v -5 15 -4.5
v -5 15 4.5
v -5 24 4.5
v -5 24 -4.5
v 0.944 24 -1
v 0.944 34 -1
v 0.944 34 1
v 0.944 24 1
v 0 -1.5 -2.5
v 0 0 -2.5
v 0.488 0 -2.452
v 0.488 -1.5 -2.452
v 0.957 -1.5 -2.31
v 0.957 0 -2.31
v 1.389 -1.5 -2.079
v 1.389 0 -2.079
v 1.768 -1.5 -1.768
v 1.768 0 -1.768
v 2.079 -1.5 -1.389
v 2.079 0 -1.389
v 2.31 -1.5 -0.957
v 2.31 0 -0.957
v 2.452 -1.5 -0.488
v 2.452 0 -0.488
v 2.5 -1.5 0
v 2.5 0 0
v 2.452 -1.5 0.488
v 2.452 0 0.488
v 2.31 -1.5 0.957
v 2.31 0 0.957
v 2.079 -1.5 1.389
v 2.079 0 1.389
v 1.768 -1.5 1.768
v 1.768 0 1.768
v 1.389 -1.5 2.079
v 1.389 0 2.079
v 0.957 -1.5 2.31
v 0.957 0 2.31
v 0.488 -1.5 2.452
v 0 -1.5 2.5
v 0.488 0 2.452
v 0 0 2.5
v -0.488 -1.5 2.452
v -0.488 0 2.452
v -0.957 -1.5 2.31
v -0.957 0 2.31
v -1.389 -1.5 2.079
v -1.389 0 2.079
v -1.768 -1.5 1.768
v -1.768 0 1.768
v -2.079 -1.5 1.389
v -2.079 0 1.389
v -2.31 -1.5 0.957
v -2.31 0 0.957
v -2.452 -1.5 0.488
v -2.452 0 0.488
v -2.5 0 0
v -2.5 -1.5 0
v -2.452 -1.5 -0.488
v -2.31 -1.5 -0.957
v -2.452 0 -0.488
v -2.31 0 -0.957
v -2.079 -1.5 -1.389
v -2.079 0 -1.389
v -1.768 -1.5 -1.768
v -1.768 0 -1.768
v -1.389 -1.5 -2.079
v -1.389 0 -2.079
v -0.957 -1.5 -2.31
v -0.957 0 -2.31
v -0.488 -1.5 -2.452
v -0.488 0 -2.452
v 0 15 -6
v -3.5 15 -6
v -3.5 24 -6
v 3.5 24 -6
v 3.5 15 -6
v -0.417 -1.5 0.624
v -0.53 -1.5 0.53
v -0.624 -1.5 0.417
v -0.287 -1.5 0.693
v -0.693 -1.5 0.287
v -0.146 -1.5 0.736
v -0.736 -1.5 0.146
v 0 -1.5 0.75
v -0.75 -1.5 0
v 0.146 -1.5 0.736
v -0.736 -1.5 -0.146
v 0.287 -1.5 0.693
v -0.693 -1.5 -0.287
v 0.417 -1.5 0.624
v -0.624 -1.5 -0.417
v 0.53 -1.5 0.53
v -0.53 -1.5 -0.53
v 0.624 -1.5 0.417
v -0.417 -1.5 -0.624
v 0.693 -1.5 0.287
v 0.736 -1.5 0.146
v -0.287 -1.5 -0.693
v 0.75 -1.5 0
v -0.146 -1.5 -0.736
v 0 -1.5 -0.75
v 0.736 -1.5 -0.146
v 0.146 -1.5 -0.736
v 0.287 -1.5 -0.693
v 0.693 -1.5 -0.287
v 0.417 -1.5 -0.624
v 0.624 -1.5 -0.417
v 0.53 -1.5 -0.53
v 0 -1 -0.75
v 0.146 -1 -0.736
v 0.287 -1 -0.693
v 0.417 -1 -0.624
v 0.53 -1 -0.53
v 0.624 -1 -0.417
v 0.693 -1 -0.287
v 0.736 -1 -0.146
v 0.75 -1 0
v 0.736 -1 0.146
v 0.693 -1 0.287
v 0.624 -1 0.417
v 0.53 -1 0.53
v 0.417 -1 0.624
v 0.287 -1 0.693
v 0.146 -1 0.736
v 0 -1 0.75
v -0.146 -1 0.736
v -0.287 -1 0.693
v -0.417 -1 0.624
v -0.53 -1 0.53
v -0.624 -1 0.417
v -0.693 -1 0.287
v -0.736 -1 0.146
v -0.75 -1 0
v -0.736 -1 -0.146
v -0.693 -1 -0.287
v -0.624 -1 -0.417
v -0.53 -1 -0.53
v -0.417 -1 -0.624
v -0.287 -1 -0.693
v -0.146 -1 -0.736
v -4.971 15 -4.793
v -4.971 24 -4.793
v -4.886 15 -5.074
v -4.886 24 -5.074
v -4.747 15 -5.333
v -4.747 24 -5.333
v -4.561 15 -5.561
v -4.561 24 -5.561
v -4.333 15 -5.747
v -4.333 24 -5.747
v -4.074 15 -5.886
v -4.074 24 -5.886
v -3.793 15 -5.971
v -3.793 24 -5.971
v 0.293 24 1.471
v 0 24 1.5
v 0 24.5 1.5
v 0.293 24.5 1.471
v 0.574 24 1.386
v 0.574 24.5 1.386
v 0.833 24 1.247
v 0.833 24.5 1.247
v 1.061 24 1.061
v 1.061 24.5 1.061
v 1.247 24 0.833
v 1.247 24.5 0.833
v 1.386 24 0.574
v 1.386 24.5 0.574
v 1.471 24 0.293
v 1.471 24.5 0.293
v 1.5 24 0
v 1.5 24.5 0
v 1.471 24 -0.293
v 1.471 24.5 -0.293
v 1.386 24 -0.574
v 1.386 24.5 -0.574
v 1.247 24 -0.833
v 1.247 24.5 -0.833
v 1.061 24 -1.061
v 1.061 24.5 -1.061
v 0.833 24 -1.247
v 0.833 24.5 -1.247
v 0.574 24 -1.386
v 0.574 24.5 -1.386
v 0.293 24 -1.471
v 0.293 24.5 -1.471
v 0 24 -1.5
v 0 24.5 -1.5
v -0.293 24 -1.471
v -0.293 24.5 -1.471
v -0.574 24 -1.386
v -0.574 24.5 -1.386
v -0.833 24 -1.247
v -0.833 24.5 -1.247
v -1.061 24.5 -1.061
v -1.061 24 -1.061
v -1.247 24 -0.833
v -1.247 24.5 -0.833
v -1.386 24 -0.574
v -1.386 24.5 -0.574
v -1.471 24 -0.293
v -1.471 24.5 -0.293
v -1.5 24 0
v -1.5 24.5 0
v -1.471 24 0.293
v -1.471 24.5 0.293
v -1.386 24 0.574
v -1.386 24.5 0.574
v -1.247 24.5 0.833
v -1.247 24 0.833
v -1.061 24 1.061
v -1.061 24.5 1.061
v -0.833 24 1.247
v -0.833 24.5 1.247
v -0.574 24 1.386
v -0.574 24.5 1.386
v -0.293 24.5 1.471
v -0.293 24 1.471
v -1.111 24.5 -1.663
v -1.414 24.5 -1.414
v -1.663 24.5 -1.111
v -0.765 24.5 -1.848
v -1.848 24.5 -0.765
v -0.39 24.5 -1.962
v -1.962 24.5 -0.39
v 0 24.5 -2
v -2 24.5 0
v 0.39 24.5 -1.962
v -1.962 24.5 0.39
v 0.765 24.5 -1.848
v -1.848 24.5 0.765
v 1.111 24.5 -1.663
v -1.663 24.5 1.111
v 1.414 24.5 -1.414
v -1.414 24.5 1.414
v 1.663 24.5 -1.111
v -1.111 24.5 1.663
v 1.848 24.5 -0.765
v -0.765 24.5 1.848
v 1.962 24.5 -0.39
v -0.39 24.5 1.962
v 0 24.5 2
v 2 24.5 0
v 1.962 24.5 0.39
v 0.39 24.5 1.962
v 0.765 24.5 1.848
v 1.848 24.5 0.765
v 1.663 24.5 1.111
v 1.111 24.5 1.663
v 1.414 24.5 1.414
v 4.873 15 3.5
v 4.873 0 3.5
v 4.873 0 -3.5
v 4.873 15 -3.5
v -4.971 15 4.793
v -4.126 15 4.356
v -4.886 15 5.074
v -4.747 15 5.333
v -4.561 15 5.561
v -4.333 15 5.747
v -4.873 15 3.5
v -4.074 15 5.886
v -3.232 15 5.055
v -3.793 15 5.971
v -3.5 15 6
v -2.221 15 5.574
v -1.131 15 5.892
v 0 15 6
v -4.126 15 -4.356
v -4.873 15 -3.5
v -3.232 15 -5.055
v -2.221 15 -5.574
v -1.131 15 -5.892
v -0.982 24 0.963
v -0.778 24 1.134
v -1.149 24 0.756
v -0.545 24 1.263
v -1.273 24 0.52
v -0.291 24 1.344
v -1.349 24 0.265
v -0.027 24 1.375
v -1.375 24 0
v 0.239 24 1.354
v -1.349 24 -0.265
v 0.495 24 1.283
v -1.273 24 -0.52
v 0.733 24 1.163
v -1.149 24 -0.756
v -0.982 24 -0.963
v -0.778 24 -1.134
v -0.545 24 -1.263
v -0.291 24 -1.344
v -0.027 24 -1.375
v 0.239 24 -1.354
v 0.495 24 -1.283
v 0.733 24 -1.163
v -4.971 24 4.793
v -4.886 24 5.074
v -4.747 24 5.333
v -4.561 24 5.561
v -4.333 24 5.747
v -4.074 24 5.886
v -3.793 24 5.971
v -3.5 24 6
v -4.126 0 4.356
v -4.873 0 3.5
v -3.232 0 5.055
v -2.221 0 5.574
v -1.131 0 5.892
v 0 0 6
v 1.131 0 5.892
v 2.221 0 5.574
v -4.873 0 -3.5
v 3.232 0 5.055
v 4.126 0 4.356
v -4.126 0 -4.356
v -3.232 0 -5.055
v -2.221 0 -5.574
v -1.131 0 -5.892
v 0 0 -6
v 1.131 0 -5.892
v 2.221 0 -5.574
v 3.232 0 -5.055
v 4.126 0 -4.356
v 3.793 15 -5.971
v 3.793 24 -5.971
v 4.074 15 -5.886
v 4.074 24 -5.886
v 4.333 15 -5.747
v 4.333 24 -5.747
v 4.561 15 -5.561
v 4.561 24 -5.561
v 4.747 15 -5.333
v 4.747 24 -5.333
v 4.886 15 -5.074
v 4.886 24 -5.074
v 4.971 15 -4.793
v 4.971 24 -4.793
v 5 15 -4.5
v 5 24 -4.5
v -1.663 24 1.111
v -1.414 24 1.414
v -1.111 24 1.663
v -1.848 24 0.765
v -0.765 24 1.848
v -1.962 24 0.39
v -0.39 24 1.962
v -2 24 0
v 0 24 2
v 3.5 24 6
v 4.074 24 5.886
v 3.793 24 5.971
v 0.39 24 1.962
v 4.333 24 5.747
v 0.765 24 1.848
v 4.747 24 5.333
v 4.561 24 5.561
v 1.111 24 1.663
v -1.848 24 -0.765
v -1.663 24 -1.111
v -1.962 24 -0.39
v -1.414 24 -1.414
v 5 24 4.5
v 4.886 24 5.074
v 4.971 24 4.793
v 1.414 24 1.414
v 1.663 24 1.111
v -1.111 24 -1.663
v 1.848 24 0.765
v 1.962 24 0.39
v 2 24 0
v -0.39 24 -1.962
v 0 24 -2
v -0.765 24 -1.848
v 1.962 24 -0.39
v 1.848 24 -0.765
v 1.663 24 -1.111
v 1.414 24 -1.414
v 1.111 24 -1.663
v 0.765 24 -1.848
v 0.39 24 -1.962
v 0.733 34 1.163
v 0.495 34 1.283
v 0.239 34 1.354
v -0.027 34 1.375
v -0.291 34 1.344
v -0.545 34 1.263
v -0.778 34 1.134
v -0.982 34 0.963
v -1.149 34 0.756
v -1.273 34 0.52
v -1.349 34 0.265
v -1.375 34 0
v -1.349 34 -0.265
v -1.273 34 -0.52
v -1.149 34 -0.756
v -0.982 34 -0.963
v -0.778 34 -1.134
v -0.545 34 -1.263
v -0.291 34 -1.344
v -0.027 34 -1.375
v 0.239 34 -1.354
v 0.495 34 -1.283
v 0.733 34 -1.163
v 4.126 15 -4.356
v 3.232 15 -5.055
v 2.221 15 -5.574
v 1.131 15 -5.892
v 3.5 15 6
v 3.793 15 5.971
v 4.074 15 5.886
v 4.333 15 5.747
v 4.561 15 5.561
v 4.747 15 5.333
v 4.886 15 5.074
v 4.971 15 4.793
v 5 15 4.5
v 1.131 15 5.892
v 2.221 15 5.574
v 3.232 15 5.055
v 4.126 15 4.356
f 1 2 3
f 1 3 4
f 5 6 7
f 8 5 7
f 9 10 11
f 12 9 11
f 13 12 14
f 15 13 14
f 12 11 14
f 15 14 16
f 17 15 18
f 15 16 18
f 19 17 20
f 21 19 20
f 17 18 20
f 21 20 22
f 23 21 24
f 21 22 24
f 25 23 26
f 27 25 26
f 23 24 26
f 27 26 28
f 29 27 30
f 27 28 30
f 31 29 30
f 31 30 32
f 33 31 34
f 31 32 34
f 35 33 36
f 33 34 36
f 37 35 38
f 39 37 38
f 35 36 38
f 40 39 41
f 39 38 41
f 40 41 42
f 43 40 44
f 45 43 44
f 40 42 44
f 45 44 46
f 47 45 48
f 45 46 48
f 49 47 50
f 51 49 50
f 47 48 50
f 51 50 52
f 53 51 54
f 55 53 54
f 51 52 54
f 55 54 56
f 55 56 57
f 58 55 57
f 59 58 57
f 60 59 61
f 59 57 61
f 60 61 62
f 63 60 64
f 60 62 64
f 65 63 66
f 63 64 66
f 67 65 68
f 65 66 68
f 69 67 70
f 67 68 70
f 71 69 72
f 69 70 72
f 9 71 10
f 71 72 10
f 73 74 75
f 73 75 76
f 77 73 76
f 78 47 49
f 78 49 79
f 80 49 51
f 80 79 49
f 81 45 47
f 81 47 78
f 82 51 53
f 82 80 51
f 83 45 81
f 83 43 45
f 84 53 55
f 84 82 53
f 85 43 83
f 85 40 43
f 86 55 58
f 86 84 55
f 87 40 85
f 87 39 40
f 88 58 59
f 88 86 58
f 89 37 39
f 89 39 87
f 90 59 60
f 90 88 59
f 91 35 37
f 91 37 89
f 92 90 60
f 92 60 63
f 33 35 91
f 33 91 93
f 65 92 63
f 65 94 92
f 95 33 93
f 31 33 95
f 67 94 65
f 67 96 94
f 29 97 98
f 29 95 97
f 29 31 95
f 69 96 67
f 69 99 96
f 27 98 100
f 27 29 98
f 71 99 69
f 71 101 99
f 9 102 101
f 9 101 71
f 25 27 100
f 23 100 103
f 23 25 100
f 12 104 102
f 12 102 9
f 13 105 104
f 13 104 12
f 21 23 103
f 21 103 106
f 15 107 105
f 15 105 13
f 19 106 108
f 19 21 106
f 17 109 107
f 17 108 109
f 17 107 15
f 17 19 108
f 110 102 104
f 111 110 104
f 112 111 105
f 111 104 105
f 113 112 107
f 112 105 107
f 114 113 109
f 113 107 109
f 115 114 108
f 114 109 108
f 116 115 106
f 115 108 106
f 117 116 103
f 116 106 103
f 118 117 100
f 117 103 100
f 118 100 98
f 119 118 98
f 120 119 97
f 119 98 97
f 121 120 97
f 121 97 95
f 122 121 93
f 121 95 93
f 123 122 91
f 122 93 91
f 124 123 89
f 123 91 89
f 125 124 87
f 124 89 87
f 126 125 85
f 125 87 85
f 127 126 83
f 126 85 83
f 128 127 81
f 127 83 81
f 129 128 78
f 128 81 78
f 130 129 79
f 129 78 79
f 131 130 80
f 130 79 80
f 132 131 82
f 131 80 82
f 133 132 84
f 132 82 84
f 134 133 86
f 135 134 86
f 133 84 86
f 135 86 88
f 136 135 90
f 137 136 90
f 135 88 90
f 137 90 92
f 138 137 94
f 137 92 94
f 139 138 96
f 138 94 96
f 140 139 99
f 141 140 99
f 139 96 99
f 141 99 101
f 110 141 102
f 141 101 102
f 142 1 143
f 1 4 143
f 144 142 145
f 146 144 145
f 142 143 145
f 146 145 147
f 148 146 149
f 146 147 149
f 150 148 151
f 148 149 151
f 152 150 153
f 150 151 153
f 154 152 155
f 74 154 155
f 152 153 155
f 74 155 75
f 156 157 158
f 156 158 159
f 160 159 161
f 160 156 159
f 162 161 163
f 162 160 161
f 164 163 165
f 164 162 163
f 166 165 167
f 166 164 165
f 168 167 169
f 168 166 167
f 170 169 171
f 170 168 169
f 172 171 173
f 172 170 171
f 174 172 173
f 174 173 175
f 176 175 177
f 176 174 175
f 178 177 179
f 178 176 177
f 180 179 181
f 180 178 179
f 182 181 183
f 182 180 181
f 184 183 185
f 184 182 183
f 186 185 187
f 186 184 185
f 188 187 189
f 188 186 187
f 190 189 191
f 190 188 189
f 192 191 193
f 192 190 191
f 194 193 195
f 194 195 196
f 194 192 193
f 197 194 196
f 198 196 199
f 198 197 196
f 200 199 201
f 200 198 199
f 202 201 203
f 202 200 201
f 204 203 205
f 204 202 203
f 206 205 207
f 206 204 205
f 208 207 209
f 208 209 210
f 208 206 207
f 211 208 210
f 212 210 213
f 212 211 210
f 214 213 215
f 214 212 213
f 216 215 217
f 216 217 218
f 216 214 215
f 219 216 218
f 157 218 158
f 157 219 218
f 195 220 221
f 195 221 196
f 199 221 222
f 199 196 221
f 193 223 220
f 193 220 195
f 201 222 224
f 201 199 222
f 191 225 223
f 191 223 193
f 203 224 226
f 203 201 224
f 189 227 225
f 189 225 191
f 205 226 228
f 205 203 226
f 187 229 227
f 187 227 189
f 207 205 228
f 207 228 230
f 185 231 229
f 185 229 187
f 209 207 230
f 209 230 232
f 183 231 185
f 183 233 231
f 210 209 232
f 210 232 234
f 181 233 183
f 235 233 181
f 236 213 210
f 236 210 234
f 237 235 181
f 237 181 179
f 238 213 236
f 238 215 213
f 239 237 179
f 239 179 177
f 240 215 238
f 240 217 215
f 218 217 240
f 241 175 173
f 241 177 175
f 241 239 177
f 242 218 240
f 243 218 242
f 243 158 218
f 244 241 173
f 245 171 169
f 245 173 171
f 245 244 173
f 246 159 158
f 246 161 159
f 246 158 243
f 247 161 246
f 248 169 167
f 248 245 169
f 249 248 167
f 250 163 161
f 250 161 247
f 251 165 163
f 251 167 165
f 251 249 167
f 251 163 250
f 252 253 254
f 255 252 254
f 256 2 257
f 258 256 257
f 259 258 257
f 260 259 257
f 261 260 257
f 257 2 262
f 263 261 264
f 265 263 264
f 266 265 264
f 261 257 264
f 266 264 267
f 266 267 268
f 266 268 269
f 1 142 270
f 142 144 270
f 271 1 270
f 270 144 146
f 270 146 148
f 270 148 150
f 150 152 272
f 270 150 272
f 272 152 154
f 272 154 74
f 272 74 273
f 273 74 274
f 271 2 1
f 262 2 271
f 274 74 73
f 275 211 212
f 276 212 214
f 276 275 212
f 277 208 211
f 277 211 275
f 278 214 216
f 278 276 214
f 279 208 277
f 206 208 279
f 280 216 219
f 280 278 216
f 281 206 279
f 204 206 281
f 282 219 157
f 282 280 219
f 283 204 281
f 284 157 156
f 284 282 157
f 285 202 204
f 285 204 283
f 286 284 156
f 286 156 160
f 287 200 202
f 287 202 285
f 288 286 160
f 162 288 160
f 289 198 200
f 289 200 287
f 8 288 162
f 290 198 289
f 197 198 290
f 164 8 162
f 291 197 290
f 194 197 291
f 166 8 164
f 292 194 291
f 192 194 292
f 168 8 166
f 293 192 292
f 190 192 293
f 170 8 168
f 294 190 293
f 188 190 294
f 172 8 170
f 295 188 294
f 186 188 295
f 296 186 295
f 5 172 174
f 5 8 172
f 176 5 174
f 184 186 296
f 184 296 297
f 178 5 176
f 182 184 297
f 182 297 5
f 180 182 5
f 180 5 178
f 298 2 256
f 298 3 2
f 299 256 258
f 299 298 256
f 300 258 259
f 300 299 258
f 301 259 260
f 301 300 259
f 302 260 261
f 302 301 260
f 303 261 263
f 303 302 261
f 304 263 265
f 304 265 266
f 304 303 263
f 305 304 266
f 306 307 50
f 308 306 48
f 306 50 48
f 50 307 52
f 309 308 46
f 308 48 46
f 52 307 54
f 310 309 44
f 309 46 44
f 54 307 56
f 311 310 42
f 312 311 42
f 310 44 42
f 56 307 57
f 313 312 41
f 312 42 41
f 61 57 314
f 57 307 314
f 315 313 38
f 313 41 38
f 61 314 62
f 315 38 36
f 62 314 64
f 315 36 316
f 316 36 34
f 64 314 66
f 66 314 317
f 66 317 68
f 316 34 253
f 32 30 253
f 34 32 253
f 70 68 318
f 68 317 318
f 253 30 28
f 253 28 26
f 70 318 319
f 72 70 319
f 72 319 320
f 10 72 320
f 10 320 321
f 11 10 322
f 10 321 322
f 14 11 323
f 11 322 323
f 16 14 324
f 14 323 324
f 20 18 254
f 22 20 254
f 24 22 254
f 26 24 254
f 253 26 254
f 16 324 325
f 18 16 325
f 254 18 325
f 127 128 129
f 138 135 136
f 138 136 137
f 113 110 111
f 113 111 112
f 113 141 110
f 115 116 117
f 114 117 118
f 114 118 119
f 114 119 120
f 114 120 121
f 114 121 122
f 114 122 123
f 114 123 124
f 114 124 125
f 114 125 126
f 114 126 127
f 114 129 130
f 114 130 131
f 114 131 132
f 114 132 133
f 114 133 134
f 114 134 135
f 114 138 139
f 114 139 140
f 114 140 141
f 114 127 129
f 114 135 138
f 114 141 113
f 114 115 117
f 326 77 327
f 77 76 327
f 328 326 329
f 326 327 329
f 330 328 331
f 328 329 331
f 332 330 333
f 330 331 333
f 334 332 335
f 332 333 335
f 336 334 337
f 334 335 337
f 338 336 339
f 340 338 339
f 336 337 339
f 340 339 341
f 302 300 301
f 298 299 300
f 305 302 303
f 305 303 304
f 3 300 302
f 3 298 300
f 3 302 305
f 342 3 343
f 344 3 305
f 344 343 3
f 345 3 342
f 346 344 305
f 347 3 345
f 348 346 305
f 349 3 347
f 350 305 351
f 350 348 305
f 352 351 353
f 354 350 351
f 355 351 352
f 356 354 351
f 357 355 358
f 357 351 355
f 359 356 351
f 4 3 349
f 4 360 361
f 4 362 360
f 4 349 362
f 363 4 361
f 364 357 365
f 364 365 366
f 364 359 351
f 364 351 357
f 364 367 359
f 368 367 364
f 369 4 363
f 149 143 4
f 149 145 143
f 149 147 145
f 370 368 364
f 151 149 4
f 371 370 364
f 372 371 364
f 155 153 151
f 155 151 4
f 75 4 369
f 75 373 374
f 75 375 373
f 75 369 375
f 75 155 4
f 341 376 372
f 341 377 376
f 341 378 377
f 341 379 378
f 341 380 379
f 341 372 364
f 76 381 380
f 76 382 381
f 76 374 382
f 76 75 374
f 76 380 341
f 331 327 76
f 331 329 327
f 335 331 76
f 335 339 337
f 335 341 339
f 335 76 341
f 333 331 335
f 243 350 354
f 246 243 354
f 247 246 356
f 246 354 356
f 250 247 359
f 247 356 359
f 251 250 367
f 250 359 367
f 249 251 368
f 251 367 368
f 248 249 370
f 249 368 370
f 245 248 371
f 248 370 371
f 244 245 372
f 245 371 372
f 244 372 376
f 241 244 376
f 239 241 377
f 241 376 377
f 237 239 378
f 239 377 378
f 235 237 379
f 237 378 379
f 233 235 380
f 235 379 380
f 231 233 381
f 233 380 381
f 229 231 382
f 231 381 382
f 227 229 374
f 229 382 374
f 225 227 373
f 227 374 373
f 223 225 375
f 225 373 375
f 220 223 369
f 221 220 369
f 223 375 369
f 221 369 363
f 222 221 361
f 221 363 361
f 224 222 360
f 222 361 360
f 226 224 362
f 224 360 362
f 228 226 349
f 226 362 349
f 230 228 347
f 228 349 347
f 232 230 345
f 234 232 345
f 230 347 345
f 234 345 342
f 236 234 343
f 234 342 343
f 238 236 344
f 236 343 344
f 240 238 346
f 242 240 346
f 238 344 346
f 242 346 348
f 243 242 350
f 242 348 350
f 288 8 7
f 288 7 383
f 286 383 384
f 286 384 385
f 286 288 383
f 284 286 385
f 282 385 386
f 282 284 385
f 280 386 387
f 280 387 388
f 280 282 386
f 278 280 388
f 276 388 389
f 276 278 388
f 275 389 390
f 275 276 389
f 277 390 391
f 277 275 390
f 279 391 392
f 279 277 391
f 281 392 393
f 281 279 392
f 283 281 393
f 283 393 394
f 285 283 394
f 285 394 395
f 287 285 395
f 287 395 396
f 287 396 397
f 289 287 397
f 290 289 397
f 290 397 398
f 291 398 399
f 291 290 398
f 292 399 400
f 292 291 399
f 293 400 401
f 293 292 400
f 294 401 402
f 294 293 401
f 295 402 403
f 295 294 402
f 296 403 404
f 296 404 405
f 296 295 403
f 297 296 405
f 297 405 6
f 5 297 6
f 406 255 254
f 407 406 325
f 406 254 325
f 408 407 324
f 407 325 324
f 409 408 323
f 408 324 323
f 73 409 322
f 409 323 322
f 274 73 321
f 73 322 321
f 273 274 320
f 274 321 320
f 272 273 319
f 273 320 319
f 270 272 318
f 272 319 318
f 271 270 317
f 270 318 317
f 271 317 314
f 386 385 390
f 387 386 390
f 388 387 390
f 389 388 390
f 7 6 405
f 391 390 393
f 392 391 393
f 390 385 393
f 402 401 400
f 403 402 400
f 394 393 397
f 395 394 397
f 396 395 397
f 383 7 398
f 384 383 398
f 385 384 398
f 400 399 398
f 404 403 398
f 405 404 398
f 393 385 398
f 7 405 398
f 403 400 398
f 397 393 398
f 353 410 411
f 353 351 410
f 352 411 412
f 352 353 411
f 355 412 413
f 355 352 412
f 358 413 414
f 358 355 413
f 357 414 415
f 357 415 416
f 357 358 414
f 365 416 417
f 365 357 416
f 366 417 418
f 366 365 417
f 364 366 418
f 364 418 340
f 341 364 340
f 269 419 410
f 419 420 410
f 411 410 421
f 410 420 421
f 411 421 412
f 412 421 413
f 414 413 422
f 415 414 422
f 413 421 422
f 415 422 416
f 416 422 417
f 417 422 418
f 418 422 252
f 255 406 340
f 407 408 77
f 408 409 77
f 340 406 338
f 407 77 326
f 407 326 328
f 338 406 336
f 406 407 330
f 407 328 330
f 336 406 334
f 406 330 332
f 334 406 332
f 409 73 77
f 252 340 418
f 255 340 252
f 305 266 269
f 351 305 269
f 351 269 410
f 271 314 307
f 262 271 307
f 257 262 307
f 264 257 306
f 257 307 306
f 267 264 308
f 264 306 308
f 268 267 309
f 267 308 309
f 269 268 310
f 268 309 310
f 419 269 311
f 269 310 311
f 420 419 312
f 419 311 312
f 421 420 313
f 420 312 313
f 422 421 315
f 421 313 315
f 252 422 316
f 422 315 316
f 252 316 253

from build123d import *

# Parameters (mm, degrees)
EXTRUDE_1_DEPTH     = 15
SKETCH_2_W          = 10
SKETCH_2_H          = 12
EXTRUDE_2_DEPTH     = 9
FILLET_1_R          = 1.5
SKETCH_3_R          = 2
SKETCH_3_R_2        = 1.5
EXTRUDE_3_DEPTH     = 0.5
EXTRUDE_4_DEPTH     = 10
SKETCH_5_R          = 2.5
EXTRUDE_5_DEPTH     = 1.5
SKETCH_6_R          = 0.75
CUT_EXTRUDE_1_DEPTH = 0.5


with BuildPart() as part:
    # 草图1 → 凸台-拉伸1 (new body)
    with BuildSketch(Plane(origin=(0, 0, 0), x_dir=(1, 0, 0), z_dir=(0, 1, 0))):
        with BuildLine():
            Line((4.873397172, -3.5), (4.873397172, 3.5))
            ThreePointArc((4.873397172, 3.5), (0, 6), (-4.873397172, 3.5))
            Line((-4.873397172, 3.5), (-4.873397172, -3.5))
            ThreePointArc((-4.873397172, -3.5), (0, -6), (4.873397172, -3.5))
        make_face()
    extrude(amount=EXTRUDE_1_DEPTH)

    # 草图2 → 凸台-拉伸2 (add)
    with BuildSketch(Plane(origin=(0, 15, 0), x_dir=(1, 0, 0), z_dir=(0, 1, 0))):
        Rectangle(SKETCH_2_W, SKETCH_2_H)
    extrude(amount=EXTRUDE_2_DEPTH)

    # 圆角1
    fillet_1_edges = [part.edges().sort_by_distance(p)[0] for p in [
        (-5, 19.5, -6),
        (-5, 19.5, 6),
        (5, 19.5, 6),
        (5, 19.5, -6),
    ]]
    fillet(fillet_1_edges, radius=FILLET_1_R)

    # 草图3 → 凸台-拉伸3 (add)
    with BuildSketch(Plane(origin=(0, 24, 0), x_dir=(1, 0, 0), z_dir=(0, 1, 0))):
        with Locations(Location((0, 0, 0), (0, 0, 270))):
            Circle(SKETCH_3_R)
        with Locations(Location((0, 0, 0), (0, 0, 270))):
            Circle(SKETCH_3_R_2, mode=Mode.SUBTRACT)
    extrude(amount=EXTRUDE_3_DEPTH)

    # 草图4 → 凸台-拉伸4 (add)
    with BuildSketch(Plane(origin=(0, 24, 0), x_dir=(1, 0, 0), z_dir=(0, 1, 0))):
        with BuildLine():
            Line((0.943729304, 1), (0.943729304, -1))
            ThreePointArc((0.943729304, -1), (-1.375, 0), (0.943729304, 1))
        make_face()
    extrude(amount=EXTRUDE_4_DEPTH)

    # 草图5 → 凸台-拉伸5 (add)
    with BuildSketch(Plane.XZ):
        with Locations(Location((0, 0, 0), (0, 0, 270))):
            Circle(SKETCH_5_R)
    extrude(amount=EXTRUDE_5_DEPTH)

    # 草图6 → 切除-拉伸1 (cut)
    with BuildSketch(Plane.XZ.offset(1.5)):
        with Locations(Location((0, 0, 0), (0, 0, 270))):
            Circle(SKETCH_6_R)
    extrude(amount=-CUT_EXTRUDE_1_DEPTH, mode=Mode.SUBTRACT)


solid = part.part
